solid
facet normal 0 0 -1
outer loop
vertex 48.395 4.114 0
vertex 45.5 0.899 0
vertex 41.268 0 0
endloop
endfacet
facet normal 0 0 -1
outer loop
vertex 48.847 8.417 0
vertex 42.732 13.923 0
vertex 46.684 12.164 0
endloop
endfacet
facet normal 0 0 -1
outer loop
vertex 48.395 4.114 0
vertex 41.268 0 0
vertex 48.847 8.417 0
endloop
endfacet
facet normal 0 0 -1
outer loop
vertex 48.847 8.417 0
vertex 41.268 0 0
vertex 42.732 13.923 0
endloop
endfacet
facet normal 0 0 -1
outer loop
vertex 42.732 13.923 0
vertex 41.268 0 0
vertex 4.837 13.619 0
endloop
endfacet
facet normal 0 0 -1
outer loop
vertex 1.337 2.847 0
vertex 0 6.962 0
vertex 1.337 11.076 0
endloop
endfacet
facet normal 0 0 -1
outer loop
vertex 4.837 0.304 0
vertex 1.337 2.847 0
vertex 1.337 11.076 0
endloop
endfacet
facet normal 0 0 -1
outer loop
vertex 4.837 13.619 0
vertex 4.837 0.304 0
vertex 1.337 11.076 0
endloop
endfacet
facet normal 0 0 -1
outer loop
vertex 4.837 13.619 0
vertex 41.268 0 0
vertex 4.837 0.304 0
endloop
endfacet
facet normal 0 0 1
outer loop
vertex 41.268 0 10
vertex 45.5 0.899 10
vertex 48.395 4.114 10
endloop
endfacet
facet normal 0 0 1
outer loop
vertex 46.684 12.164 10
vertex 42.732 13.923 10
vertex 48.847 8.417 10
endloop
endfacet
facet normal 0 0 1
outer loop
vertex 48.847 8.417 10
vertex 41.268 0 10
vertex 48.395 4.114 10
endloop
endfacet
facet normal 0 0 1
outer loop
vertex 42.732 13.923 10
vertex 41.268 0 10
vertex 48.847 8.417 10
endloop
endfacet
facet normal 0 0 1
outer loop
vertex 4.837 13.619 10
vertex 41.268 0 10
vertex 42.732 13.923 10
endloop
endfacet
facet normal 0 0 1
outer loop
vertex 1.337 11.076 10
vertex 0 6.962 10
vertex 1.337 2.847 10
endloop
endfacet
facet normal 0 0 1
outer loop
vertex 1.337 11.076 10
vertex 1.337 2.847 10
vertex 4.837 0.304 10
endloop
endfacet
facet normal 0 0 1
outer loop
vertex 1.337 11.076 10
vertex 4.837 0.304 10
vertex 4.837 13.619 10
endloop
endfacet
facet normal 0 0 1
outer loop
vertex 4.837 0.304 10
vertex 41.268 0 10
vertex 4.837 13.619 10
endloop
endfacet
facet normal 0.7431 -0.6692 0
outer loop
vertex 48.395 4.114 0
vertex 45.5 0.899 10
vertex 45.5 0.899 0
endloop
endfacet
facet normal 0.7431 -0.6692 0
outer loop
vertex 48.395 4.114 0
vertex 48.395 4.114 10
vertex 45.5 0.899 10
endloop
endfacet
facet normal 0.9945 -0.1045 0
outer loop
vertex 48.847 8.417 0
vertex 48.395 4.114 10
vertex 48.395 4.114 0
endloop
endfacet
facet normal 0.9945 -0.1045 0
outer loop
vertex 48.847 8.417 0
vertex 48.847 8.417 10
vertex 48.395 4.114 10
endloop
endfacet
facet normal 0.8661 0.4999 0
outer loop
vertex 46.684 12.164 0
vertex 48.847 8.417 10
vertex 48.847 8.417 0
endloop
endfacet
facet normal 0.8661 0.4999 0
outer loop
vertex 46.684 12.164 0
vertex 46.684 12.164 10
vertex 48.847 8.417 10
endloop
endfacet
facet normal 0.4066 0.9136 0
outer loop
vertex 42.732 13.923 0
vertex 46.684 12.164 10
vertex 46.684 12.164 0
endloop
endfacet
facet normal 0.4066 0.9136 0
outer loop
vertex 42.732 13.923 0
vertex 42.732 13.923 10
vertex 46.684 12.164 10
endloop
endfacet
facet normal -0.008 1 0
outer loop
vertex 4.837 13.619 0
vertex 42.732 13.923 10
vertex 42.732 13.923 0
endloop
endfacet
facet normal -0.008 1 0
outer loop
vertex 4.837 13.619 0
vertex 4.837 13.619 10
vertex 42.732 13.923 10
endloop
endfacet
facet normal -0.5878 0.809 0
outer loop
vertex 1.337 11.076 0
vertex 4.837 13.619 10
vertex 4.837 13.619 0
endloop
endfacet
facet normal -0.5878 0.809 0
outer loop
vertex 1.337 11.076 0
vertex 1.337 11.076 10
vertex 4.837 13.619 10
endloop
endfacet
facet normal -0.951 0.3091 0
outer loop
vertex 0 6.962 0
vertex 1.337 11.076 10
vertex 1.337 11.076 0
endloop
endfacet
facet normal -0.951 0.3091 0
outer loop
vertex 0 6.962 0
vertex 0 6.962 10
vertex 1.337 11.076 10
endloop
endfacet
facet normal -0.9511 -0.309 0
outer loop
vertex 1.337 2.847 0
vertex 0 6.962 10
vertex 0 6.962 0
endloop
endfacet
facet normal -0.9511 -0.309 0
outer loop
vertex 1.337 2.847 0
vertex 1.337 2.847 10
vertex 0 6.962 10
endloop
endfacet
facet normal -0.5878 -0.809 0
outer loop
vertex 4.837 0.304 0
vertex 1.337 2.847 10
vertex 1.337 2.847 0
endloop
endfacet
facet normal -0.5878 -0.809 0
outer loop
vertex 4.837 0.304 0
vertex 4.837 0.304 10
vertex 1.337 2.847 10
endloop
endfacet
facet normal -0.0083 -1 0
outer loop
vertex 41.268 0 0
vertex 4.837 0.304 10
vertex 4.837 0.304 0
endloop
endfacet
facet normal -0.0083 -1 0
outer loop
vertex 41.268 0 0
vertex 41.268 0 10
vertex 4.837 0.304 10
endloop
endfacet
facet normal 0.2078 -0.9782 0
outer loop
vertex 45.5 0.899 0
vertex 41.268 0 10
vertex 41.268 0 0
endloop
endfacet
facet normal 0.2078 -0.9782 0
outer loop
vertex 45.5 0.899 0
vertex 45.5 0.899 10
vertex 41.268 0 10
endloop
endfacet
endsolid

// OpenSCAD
$fn = 32;

// ----------------------------------------------------------------------
// Lever arm: two bosses 14 and 14 mm, 35 mm between centres
// ----------------------------------------------------------------------

// --- parameters (mm) ---
profile_height = 10;      // extrusion height
profile_points = 11;      // points of the closed outline

profile = [[0, 6.962], [1.337, 2.847], [4.837, 0.304], [41.268, 0], [45.5, 0.899], [48.395, 4.114], [48.847, 8.417], [46.684, 12.164], [42.732, 13.923], [4.837, 13.619], [1.337, 11.076]];  // single closed polygon, 11 points, counter clockwise

// --- the one profile operation ---
linear_extrude(height = profile_height) polygon(points = profile);
